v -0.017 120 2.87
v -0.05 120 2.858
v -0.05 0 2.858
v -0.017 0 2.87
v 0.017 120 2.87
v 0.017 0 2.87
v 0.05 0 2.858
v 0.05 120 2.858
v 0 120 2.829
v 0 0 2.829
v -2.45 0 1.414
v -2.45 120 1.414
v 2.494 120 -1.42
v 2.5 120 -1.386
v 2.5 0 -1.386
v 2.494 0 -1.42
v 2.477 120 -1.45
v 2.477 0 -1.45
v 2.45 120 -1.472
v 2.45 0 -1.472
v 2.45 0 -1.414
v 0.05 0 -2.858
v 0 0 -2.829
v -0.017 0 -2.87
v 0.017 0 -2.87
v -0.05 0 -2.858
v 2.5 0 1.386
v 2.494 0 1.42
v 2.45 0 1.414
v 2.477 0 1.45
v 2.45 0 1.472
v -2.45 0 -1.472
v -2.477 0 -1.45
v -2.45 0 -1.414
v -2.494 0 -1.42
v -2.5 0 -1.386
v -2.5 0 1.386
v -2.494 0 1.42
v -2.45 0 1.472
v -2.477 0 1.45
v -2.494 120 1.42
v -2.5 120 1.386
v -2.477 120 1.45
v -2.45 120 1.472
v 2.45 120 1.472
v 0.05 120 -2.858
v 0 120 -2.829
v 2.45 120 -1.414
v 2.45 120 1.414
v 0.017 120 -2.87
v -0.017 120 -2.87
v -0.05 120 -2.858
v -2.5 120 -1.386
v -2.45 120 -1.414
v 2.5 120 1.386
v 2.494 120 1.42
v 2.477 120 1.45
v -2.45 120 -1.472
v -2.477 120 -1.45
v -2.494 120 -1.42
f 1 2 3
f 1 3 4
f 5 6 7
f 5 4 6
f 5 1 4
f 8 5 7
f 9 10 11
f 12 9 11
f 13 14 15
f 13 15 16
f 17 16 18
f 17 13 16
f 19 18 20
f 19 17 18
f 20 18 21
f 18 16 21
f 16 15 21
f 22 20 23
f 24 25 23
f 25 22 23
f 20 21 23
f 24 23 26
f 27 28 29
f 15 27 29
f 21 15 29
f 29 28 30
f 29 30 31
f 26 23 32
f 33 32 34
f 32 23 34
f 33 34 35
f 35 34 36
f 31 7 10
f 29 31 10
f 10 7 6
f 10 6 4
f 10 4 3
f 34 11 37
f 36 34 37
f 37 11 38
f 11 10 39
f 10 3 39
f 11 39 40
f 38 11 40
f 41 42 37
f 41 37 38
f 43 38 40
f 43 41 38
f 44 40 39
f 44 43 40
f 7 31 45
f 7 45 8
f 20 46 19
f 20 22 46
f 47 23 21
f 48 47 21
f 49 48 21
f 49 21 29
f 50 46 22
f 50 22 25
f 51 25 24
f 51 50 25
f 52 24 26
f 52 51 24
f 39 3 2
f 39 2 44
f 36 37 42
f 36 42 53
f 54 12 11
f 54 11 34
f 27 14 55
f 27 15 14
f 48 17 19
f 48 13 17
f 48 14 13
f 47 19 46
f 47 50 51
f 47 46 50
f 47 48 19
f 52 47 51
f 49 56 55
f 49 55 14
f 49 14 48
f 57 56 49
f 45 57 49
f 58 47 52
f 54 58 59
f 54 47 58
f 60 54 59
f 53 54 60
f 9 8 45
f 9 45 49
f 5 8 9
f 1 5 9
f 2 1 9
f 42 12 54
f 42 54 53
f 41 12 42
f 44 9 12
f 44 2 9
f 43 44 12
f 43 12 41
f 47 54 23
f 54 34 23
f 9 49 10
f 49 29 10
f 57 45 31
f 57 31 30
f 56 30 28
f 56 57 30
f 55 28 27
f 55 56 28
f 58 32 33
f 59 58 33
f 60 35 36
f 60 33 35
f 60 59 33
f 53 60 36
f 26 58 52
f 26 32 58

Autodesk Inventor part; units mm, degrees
ref_plane "YZ Plane" through (0, 0, 0) normal (1, 0, 0) x (0, 1, 0)
ref_plane "XZ Plane" through (0, 0, 0) normal (0, 1, 0) x (-1, 0, 0)
ref_plane "XY Plane" through (0, 0, 0) normal (0, 0, 1) x (1, 0, 0)
sketch "Sketch1" plane through (0, 0, 0) normal (0, 1, 0) x (-1, 0, 0)
  line L0 (-2.5, 1.4434) -> (0, 2.8868)
  line L1 (0, 2.8868) -> (2.5, 1.4434)
  line L2 (2.5, 1.4434) -> (2.5, -1.4434)
  line L3 (2.5, -1.4434) -> (0, -2.8868)
  line L4 (0, -2.8868) -> (-2.5, -1.4434)
  line L5 (-2.5, -1.4434) -> (-2.5, 1.4434)
  line L6 (-2.45, 1.4145) -> (0, 2.829)
  line L7 (0, 2.829) -> (2.45, 1.4145)
  line L8 (2.45, 1.4145) -> (2.45, -1.4145)
  line L9 (2.45, -1.4145) -> (0, -2.829)
  line L10 (0, -2.829) -> (-2.45, -1.4145)
  line L11 (-2.45, -1.4145) -> (-2.45, 1.4145)
  point P0 (0, 0)
  point P1 (0, 0)
  point P2 (0, 0)
  dimension "d0" = 5
  dimension "d1" = 4.9
extrude "Extrusion1" add sketch "Sketch1" along normal blind 120
fillet "Fillet1" radius 0.1 6 edges at (0, 60, 2.8868) (2.5, 60, -1.4434) (0, 60, -2.8868) (-2.5, 60, -1.4434) (-2.5, 60, 1.4434) (2.5, 60, 1.4434)
properties part number "Pencil Outside"
